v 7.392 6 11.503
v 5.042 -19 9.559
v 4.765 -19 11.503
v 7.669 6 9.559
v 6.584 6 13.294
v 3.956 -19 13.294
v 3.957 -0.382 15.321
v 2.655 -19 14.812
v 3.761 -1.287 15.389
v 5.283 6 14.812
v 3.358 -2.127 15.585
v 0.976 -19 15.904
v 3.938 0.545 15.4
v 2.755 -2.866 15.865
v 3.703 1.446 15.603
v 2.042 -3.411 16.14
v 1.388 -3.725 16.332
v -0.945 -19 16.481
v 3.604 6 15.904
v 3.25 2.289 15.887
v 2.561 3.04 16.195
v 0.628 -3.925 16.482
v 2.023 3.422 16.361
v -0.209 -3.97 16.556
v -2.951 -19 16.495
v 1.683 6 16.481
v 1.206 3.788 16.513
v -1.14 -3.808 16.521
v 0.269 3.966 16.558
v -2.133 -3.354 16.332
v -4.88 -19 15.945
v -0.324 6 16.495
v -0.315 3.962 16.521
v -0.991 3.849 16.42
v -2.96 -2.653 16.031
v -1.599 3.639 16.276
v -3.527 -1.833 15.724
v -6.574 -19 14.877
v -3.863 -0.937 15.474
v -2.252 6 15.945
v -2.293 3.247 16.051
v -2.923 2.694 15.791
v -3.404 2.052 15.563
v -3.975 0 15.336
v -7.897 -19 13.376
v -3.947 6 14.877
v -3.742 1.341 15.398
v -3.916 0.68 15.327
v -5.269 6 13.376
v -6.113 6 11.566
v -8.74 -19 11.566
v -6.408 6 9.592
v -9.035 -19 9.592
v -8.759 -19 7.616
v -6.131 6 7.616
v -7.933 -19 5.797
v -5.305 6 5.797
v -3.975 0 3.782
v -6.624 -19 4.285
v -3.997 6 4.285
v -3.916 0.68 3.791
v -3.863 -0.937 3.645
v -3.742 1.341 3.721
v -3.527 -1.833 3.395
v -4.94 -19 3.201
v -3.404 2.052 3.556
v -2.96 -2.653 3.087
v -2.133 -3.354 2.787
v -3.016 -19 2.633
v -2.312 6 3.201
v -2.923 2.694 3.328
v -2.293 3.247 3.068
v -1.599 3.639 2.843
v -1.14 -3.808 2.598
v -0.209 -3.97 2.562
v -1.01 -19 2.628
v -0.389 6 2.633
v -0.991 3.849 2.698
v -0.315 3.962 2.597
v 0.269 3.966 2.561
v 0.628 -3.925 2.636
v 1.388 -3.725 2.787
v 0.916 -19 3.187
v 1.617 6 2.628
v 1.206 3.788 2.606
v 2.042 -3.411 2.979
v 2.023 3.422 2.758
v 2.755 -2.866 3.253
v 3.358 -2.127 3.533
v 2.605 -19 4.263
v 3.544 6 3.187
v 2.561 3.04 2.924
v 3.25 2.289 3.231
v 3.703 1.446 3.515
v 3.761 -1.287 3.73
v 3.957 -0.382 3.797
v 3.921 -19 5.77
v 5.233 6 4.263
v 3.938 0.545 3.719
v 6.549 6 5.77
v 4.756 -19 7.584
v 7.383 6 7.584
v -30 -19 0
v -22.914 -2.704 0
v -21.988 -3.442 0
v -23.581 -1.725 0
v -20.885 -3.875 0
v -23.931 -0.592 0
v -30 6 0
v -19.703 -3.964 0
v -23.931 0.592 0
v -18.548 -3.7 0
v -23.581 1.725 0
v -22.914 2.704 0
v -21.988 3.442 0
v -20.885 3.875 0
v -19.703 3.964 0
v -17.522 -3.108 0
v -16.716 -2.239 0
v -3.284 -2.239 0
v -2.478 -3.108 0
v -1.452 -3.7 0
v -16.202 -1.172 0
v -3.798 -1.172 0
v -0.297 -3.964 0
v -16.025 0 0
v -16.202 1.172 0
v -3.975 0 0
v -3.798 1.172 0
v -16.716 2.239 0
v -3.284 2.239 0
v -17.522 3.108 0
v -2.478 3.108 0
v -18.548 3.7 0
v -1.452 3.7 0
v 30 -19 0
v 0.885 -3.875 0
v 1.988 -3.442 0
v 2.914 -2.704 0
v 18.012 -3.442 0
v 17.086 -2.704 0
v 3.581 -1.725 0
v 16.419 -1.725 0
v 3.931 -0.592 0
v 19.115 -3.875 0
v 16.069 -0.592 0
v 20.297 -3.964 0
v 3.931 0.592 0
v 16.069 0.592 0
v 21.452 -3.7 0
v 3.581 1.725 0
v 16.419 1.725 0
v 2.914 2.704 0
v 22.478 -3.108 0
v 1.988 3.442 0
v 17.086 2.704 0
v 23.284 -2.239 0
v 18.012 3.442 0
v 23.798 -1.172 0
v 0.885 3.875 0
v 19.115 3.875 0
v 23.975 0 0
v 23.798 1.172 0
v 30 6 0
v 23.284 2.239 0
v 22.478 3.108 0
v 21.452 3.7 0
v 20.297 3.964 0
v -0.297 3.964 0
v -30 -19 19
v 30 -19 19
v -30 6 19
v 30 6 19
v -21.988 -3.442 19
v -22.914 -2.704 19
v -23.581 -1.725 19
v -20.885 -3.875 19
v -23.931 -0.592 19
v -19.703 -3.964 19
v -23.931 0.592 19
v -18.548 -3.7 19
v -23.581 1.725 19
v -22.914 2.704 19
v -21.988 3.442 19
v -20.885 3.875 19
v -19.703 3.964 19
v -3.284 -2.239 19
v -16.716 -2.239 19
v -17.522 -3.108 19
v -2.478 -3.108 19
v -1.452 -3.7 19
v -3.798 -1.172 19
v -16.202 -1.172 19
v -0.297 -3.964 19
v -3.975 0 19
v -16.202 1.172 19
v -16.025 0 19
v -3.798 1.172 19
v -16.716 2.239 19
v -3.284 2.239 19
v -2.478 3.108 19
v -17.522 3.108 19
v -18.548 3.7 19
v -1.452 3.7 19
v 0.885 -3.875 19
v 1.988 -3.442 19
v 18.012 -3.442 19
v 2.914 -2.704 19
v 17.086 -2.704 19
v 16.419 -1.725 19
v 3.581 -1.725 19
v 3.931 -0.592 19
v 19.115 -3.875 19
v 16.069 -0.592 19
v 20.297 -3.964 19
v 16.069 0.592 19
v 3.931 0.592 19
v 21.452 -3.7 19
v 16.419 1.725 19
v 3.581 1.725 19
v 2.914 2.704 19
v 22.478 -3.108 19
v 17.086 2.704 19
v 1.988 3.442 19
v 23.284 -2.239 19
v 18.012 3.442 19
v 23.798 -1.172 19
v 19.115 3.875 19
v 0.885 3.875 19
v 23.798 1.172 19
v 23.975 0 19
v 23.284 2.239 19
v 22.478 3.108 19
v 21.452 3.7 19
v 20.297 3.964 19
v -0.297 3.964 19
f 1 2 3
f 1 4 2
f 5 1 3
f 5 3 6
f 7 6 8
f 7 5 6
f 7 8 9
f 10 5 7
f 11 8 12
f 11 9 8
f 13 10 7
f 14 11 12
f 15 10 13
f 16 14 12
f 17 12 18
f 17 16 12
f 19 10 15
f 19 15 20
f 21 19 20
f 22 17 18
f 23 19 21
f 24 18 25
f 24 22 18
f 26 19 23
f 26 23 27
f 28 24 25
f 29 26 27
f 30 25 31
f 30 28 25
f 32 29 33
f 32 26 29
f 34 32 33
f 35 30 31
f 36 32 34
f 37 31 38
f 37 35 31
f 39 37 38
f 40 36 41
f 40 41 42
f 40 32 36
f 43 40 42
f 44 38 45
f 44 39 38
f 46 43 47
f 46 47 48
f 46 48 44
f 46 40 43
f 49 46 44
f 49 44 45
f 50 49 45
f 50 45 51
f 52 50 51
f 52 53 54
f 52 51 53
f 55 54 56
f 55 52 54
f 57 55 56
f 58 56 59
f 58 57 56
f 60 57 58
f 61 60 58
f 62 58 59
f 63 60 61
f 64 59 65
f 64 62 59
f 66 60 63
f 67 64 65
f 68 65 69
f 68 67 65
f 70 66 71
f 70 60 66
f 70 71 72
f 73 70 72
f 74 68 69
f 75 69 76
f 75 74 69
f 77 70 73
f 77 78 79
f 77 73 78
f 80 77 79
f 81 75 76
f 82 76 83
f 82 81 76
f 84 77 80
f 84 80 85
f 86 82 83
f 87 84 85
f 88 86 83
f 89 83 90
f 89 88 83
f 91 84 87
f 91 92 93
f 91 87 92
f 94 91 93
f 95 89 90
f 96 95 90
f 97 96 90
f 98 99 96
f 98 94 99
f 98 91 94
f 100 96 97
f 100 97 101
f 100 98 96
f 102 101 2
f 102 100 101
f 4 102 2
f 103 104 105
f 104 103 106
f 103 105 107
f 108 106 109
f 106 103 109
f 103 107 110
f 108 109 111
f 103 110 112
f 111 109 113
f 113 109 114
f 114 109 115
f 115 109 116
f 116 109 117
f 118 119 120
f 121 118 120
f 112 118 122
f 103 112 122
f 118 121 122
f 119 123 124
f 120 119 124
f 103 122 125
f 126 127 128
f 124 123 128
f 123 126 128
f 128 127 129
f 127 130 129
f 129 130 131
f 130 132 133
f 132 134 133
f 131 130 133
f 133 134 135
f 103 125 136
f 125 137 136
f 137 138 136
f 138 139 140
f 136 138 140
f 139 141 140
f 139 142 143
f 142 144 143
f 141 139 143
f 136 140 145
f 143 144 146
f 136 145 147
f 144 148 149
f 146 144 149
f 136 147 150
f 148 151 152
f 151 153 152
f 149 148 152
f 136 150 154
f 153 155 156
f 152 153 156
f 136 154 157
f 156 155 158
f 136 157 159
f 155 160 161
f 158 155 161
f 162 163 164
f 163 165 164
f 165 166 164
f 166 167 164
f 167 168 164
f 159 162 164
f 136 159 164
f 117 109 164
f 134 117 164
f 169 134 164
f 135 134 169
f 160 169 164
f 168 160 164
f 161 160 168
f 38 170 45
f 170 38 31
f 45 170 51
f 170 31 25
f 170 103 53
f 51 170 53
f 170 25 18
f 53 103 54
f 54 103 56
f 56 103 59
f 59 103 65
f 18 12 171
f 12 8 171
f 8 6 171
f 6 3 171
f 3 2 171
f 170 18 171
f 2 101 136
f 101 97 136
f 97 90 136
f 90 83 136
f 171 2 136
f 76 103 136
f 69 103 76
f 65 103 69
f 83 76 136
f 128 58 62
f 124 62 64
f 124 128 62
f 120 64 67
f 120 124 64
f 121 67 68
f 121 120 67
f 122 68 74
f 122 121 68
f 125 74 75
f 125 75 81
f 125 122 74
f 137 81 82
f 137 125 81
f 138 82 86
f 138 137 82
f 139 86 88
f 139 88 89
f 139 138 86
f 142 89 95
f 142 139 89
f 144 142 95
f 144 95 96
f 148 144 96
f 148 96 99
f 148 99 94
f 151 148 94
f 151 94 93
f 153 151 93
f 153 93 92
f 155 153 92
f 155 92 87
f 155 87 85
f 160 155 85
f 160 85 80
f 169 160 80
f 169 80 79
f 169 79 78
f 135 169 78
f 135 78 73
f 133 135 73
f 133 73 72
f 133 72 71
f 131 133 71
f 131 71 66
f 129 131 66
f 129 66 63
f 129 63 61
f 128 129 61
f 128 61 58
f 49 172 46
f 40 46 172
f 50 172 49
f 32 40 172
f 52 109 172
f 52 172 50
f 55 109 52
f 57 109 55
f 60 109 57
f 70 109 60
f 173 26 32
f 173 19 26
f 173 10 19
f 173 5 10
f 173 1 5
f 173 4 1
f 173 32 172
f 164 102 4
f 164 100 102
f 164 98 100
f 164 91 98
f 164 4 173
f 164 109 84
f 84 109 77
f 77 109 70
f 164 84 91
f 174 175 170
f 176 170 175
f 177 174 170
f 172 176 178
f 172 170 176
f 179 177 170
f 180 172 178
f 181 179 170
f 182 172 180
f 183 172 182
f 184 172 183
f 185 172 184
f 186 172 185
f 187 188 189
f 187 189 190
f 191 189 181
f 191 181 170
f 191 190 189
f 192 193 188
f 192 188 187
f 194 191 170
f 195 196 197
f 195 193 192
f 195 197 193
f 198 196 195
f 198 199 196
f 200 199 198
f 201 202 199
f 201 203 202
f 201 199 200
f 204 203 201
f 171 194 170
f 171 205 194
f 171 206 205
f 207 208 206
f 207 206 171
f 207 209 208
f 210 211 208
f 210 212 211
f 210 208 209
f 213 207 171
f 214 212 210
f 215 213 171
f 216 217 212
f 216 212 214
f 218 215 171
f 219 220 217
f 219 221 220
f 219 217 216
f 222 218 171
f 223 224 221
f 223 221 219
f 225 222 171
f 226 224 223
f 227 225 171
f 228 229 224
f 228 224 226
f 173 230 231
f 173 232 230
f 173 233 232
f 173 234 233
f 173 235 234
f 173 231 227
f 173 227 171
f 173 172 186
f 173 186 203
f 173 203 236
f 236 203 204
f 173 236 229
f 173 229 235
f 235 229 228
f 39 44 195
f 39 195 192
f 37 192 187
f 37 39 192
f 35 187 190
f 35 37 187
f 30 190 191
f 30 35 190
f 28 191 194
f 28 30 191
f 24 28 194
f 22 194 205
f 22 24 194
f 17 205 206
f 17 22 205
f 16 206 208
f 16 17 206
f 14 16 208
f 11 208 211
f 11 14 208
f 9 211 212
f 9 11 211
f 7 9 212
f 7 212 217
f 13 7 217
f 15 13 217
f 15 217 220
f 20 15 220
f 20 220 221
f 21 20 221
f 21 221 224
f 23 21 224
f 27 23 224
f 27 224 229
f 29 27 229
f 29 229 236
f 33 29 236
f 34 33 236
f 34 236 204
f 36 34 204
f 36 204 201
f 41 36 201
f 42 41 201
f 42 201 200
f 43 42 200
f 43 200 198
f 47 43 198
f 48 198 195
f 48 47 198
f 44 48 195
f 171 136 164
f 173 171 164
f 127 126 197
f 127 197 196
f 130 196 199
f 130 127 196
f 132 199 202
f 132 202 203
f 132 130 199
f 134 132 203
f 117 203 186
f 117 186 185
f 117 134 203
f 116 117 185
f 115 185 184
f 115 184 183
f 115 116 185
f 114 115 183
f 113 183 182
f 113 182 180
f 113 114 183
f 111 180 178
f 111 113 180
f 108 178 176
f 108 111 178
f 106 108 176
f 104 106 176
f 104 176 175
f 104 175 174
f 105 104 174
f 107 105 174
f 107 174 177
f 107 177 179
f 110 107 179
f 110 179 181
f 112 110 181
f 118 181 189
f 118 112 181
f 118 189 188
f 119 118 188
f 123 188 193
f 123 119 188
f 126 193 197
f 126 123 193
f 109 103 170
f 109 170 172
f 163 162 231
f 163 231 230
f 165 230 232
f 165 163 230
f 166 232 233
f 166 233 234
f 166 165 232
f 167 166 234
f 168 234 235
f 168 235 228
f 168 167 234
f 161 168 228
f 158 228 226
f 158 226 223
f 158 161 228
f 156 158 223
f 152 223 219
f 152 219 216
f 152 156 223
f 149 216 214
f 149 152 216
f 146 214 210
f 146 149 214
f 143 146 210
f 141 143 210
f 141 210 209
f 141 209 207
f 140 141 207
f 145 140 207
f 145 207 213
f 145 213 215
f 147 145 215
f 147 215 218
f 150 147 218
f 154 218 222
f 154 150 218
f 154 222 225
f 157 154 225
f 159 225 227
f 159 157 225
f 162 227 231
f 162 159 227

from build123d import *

# Parameters (mm, degrees)
ESQUISSE1_W          = 60
ESQUISSE1_H          = 25
ESQUISSE1_R          = 3.975
BASE_EXTRUSION_DEPTH = 19
ESQUISSE2_W          = 7
ESQUISSE2_H          = 34.447811935


with BuildPart() as part:
    # Esquisse1 → Base-Extrusion (new body)
    with BuildSketch(Plane.XY):
        with Locations((0, -6.5)):
            Rectangle(ESQUISSE1_W, ESQUISSE1_H)
        with Locations((-20, 0)):
            Circle(ESQUISSE1_R, mode=Mode.SUBTRACT)
        with Locations(Location((0, 0, 0), (0, 0, 180))):
            Circle(ESQUISSE1_R, mode=Mode.SUBTRACT)
        with Locations((20, 0)):
            Circle(ESQUISSE1_R, mode=Mode.SUBTRACT)
    extrude(amount=BASE_EXTRUSION_DEPTH)

    # Esquisse2 → Enlever de la matière-Révolution2 (revolve, cut)
    with BuildSketch(Plane(origin=(0, 0, 0), x_dir=(0, 0, -1), z_dir=(0.9945218953682731, -0.10452846326765709, 0)), mode=Mode.PRIVATE) as enlever_de_la_mati_re_r_volution2_sk:
        with Locations((-6.059329615, -6.776094032)):
            Rectangle(ESQUISSE2_W, ESQUISSE2_H)
    revolve(enlever_de_la_mati_re_r_volution2_sk.sketch.rotate(Axis((0.951521061, 9.053118164, 9.559329615), (-0.10452846326765709, -0.994521895368273, 0)), 90), axis=Axis((0.951521061, 9.053118164, 9.559329615), (-0.10452846326765709, -0.994521895368273, 0)), mode=Mode.SUBTRACT)


solid = part.part
